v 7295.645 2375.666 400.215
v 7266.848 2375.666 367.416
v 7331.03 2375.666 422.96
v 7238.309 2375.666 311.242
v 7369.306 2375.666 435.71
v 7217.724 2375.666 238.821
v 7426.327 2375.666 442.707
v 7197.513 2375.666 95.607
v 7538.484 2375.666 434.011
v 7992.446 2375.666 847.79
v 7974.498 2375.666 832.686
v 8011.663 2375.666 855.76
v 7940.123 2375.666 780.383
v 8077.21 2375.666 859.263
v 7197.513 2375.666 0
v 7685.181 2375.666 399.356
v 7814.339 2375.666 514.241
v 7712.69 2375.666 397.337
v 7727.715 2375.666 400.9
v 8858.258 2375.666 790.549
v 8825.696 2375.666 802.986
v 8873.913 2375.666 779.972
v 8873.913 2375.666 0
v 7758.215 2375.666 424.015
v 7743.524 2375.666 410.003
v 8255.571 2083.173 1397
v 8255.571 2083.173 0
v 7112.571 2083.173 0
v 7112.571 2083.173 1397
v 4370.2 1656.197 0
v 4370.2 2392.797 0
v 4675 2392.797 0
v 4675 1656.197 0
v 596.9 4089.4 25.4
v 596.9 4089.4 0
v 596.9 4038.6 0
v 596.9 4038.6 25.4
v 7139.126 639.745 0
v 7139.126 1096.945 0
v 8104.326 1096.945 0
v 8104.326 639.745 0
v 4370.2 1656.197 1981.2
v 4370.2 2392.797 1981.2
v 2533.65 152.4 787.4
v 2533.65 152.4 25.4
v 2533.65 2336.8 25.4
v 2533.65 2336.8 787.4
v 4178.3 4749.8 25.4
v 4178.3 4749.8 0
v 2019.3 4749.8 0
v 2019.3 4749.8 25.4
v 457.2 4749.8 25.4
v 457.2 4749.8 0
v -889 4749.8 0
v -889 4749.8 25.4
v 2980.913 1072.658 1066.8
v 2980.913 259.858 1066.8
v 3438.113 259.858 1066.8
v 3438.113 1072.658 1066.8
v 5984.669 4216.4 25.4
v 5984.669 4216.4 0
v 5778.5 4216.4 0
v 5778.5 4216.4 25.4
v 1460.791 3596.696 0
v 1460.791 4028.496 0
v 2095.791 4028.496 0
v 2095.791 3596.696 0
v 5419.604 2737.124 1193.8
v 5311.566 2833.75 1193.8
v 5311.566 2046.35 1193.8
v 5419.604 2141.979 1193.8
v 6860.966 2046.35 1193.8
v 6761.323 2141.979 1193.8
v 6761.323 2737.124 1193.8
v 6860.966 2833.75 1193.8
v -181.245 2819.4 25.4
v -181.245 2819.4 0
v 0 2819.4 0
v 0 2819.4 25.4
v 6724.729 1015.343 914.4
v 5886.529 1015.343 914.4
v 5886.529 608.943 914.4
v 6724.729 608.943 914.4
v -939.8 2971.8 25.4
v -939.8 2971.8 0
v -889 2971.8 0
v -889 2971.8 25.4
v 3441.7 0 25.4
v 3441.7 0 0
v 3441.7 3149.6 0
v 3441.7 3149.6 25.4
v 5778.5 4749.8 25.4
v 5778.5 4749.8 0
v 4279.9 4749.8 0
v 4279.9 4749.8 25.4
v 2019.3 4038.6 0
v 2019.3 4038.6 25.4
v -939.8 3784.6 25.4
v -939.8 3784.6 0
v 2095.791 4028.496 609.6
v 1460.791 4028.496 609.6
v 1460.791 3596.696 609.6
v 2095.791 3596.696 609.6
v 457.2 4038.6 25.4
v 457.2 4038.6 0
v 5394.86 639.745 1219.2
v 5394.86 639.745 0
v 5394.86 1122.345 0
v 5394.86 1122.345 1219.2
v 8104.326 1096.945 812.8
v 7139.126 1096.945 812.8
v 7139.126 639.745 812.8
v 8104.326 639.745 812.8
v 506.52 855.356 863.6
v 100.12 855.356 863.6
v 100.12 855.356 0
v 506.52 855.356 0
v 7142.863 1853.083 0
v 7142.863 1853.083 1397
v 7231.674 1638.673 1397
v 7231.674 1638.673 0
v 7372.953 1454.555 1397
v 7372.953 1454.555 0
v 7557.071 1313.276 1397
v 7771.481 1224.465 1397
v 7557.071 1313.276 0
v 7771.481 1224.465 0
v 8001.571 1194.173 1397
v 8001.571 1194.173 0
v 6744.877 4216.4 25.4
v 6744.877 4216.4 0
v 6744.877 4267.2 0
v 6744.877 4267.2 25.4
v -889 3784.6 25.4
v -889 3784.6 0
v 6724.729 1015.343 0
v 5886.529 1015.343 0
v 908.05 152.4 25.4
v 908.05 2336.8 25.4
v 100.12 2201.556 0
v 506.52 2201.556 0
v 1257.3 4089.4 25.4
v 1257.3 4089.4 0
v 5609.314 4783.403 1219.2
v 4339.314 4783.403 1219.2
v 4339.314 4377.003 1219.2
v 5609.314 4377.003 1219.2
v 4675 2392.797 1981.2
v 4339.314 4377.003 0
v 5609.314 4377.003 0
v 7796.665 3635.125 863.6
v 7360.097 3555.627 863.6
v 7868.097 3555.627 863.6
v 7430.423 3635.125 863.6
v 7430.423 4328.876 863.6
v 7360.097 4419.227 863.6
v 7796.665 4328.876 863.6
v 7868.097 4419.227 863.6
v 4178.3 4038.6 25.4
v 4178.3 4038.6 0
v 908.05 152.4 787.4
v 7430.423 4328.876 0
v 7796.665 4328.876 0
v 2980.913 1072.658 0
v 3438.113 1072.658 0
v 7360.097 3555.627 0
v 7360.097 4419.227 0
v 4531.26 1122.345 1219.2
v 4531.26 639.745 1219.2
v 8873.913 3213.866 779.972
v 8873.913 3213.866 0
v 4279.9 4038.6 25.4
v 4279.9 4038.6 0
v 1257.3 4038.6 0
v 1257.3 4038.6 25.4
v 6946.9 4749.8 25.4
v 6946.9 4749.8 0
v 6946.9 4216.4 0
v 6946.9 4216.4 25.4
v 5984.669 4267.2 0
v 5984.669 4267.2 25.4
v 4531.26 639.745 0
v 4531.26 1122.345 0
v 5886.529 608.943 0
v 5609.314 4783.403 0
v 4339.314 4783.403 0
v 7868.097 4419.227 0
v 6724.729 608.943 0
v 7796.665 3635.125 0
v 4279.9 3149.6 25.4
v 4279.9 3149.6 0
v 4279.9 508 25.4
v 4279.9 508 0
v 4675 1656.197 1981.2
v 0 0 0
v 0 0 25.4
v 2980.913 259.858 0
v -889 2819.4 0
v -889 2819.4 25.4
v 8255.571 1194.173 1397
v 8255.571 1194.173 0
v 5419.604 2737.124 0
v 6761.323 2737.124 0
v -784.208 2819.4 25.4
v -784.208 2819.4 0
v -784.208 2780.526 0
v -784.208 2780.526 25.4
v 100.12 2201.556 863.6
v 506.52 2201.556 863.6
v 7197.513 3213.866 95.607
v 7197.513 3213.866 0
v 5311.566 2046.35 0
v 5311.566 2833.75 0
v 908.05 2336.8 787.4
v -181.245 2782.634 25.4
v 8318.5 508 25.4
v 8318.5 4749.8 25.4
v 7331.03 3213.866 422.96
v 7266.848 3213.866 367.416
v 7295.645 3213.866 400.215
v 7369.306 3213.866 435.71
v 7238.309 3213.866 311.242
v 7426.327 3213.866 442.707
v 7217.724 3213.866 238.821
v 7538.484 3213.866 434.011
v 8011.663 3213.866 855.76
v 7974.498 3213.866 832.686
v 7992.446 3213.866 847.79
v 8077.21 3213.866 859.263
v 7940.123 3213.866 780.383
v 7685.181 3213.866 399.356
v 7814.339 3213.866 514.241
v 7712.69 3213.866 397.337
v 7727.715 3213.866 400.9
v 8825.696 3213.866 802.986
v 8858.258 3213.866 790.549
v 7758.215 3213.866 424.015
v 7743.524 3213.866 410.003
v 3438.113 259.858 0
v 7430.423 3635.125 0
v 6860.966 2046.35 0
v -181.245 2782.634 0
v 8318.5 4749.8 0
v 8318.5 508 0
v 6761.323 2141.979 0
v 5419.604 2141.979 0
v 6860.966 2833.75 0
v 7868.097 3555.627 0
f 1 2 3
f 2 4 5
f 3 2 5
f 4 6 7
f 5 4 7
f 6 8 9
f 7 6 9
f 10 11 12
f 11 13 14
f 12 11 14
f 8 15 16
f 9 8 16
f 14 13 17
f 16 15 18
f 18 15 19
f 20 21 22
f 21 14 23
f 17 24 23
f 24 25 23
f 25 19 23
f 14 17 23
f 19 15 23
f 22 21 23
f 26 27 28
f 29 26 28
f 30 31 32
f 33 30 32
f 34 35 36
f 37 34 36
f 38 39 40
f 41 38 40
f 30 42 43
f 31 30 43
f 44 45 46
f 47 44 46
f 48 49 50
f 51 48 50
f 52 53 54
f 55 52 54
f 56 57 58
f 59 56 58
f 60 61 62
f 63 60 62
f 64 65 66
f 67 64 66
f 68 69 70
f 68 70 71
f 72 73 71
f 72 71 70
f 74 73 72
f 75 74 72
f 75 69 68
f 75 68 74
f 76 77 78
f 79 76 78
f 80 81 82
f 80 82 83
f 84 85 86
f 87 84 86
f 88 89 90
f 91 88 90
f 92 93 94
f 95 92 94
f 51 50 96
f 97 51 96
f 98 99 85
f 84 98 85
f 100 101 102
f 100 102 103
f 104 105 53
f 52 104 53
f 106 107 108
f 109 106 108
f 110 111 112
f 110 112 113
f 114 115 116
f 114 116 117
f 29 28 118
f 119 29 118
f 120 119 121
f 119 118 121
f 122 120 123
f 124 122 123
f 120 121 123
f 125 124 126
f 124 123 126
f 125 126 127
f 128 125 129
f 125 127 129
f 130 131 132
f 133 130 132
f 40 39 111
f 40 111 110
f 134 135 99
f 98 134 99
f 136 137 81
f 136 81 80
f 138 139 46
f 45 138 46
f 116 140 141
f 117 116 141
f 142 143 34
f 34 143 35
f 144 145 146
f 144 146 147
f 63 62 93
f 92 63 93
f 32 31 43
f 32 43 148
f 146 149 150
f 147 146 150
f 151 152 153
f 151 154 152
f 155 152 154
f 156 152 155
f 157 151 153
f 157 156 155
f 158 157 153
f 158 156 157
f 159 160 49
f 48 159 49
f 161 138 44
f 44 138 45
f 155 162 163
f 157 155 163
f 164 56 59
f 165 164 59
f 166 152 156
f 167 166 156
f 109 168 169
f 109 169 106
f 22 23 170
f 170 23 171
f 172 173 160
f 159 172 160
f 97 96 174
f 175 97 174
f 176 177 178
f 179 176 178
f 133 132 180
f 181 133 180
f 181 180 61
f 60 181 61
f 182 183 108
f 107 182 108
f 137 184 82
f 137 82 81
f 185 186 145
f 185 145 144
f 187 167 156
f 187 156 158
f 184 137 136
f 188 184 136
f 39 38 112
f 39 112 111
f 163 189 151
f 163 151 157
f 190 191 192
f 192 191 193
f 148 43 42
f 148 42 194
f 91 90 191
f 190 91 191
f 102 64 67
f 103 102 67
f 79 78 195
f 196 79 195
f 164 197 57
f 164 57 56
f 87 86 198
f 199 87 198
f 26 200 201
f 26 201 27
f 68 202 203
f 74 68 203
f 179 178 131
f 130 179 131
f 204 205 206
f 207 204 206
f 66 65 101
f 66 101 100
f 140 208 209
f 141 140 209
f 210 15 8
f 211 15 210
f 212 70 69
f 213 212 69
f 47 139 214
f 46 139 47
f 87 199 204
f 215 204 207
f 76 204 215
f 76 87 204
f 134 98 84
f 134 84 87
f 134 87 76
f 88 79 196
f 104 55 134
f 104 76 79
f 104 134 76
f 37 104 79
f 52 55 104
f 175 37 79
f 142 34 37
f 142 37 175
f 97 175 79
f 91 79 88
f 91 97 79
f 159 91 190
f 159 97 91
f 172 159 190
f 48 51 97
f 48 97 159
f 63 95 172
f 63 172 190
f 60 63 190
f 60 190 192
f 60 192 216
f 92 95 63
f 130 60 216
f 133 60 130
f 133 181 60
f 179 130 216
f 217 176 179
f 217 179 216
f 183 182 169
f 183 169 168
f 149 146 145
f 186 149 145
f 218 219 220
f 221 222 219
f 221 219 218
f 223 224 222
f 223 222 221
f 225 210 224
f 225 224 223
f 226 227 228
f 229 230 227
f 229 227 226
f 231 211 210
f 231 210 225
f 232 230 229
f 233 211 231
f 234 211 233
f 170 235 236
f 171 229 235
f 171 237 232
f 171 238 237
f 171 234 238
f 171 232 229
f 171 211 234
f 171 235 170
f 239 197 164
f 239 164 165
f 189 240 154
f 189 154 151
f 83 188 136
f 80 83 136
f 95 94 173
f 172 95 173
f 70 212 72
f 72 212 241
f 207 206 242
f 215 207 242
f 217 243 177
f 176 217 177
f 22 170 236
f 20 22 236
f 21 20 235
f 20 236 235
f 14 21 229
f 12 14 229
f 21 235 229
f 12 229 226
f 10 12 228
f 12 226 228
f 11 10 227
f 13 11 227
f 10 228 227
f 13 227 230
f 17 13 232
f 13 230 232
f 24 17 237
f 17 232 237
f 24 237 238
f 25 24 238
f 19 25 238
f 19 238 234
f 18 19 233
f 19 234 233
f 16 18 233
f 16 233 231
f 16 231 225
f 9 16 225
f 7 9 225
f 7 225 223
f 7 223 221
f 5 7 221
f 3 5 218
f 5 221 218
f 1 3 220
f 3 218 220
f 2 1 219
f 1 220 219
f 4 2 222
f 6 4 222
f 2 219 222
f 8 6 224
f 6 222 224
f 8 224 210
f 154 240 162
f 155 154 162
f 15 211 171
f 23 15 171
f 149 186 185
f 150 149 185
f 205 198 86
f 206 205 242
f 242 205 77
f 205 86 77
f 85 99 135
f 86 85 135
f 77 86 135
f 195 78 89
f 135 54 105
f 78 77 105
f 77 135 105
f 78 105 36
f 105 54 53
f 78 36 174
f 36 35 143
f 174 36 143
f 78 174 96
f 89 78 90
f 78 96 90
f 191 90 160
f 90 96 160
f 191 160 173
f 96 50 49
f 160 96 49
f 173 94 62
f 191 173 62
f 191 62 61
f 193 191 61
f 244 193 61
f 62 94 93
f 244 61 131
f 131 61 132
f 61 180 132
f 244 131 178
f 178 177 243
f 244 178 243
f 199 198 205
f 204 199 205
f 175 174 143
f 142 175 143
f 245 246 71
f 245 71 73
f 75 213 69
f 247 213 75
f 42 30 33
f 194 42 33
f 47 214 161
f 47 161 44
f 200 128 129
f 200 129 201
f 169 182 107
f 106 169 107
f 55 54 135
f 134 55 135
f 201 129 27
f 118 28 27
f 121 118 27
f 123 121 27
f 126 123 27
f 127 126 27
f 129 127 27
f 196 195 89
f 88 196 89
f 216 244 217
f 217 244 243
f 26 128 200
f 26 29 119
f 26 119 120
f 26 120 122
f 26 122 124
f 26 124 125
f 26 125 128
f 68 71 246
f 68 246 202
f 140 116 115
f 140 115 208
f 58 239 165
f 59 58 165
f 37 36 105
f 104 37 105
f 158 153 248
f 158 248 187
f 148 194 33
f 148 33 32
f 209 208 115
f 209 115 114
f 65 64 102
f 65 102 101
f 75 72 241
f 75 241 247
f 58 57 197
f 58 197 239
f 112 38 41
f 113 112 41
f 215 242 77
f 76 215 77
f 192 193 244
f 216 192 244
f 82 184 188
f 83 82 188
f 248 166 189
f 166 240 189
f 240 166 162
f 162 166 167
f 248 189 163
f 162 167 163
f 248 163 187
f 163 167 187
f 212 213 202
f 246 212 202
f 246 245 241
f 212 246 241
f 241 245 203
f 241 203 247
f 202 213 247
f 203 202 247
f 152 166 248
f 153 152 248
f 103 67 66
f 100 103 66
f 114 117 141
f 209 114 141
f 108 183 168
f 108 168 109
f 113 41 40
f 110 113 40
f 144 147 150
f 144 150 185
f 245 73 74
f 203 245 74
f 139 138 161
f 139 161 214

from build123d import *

# Parameters (mm, degrees)
F1_DEPTH  = 25.4
F2_W      = 1625.6
F2_H      = 2184.4
F3_DEPTH  = 762
F4_W      = 1270
F4_H      = 406.4
F5_DEPTH  = 1219.2
F6_W      = 965.2
F6_H      = 457.2
F7_DEPTH  = 812.8
F8_W      = 254
F8_H      = 889
F9_DEPTH  = 1397
F10_W     = 863.6
F10_H     = 482.6
F11_DEPTH = 1219.2
F12_W     = 635
F12_H     = 431.8
F13_DEPTH = 609.6
F14_W     = 304.8
F14_H     = 736.6
F15_DEPTH = 1981.2
F16_W     = 457.2
F16_H     = 812.8
F17_DEPTH = 1066.8
F18_W     = 406.4
F18_H     = 1346.2
F19_DEPTH = 863.6
F20_W     = 838.2
F20_H     = 406.4
F21_DEPTH = 914.4
F22_W     = 1549.4
F22_H     = 787.4
F22_W_2   = 1341.7191505432
F22_H_2   = 595.1457023621
F23_DEPTH = 1193.8
F24_W     = 508
F24_H     = 863.6
F24_W_2   = 366.2426
F24_H_2   = 693.7502
F25_DEPTH = 863.6
F26_W     = 1676.4
F26_H     = 838.2
F27_DEPTH = 914.4
F29_DEPTH = 838.2


with BuildPart() as f1:
    # F0 (on Top) → F1 (new body)
    with BuildSketch(Plane.XY):
        Polygon((0, 2717.8), (0, 0), (3441.7, 0), (3441.7, 3048), (3441.7, 3149.6), (3543.3, 3149.6), (4178.3, 3149.6), (4279.9, 3149.6), (4279.9, 3048), (4279.9, 508), (8318.5, 508), (8318.5, 4749.8), (6946.9, 4749.8), (6946.9, 4216.4), (6845.3, 4216.4), (6744.8768615723, 4216.4), (6744.8768615723, 4267.2), (5984.6692085266, 4267.2), (5984.6692085266, 4216.4), (5880.1, 4216.4), (5778.5, 4216.4), (5778.5, 4318), (5778.5, 4749.8), (4279.9, 4749.8), (4279.9, 4038.6), (4178.3, 4038.6), (4178.3, 4749.8), (2019.3, 4749.8), (2019.3, 4140.2), (2019.3, 4038.6), (1917.7, 4038.6), (1485.9, 4038.6), (1397, 4038.6), (1295.4, 4038.6), (1257.3, 4038.6), (1257.3, 4089.4), (596.9, 4089.4), (596.9, 4038.6), (558.8, 4038.6), (457.2, 4038.6), (457.2, 4749.8), (-889, 4749.8), (-889, 4495.8), (-889, 3784.6), (-939.8, 3784.6), (-939.8, 2971.8), (-889, 2971.8), (-889, 2819.4), (-784.2075228691, 2819.4), (-784.2075228691, 2780.5261611938), (-181.2450289726, 2782.6342582703), (-181.2450289726, 2819.4), (-101.6, 2819.4), (0, 2819.4), align=None)
    extrude(amount=F1_DEPTH)


with BuildPart() as f3:
    # F2 (on face) → F3 (new body)
    with BuildSketch(Plane.XY.offset(25.4)):
        with Locations((1720.85, 1244.6)):
            Rectangle(F2_W, F2_H)
    extrude(amount=F3_DEPTH)


with BuildPart() as f5:
    # F4 (on Top) → F5 (new body)
    with BuildSketch(Plane.XY):
        with Locations((4974.3144416809, 4580.2027160645)):
            Rectangle(F4_W, F4_H)
    extrude(amount=F5_DEPTH)


with BuildPart() as f7:
    # F6 (on Top) → F7 (new body)
    with BuildSketch(Plane.XY):
        with Locations((7621.7263008118, 868.344579792)):
            Rectangle(F6_W, F6_H)
    extrude(amount=F7_DEPTH)


with BuildPart() as f9:
    # F8 (on Top) → F9 (new body)
    with BuildSketch(Plane.XY):
        with Locations((8128.5707015991, 1638.6728591919)):
            Rectangle(F8_W, F8_H)
        with BuildLine():
            ThreePointArc((7112.5707015991, 2083.1728591919), (7372.9527731243, 1454.5549307171), (8001.5707015991, 1194.1728591919))
            Line((8001.5707015991, 1194.1728591919), (8001.5707015991, 2083.1728591919))
            Line((8001.5707015991, 2083.1728591919), (7112.5707015991, 2083.1728591919))
        make_face()
    extrude(amount=F9_DEPTH)


with BuildPart() as f11:
    # F10 (on Top) → F11 (new body)
    with BuildSketch(Plane.XY):
        with Locations((4963.0595367432, 881.044579792)):
            Rectangle(F10_W, F10_H)
    extrude(amount=F11_DEPTH)


with BuildPart() as f13:
    # F12 (on Top) → F13 (new body)
    with BuildSketch(Plane.XY):
        with Locations((1778.290880394, 3812.5958999634)):
            Rectangle(F12_W, F12_H)
    extrude(amount=F13_DEPTH)


with BuildPart() as f15:
    # F14 (on Top) → F15 (new body)
    with BuildSketch(Plane.XY):
        with Locations((4522.6001907349, 2024.4965942383)):
            Rectangle(F14_W, F14_H)
    extrude(amount=F15_DEPTH)


with BuildPart() as f17:
    # F16 (on Top) → F17 (new body)
    with BuildSketch(Plane.XY):
        with Locations((3209.51340065, 666.2584294319)):
            Rectangle(F16_W, F16_H)
    extrude(amount=F17_DEPTH)


with BuildPart() as f19:
    # F18 (on Top) → F19 (new body)
    with BuildSketch(Plane.XY):
        with Locations((303.319973278, 1528.4556203842)):
            Rectangle(F18_W, F18_H)
    extrude(amount=F19_DEPTH)


with BuildPart() as f21:
    # F20 (on Top) → F21 (new body)
    with BuildSketch(Plane.XY):
        with Locations((6305.628968811, 812.1428663254)):
            Rectangle(F20_W, F20_H)
    extrude(amount=F21_DEPTH)


with BuildPart() as f23:
    # F22 (on Top) → F23 (new body)
    with BuildSketch(Plane.XY):
        with Locations((6086.2658760071, 2440.0500022888)):
            Rectangle(F22_W, F22_H)
        with Locations((6090.4633998871, 2439.5515918732)):
            Rectangle(F22_W_2, F22_H_2, mode=Mode.SUBTRACT)
    extrude(amount=F23_DEPTH)


with BuildPart() as f25:
    # F24 (on Top) → F25 (new body)
    with BuildSketch(Plane.XY):
        with Locations((7614.0968284607, 3987.4273460388)):
            Rectangle(F24_W, F24_H)
        with Locations((7613.5438916504, 3982.0004986359)):
            Rectangle(F24_W_2, F24_H_2, mode=Mode.SUBTRACT)
    extrude(amount=F25_DEPTH)


with BuildPart() as f27:
    # F26 (on Top) → F27 (new body)
    with BuildSketch(Plane.XY):
        with Locations((8035.7133743286, 2794.7656646729)):
            Rectangle(F26_W, F26_H)
    extrude(amount=F27_DEPTH)

    # F28 (on face) → F29 (cut, through all)
    with BuildSketch(Plane(origin=(0, 3213.8656646729, 0), x_dir=(-1, 0, 0), z_dir=(0, 1, 0))):
        with BuildLine():
            Line((-8873.9133743286, 914.4), (-8873.9133743286, 779.9721360207))
            add(Edge.make_bspline(
                [(-8873.9133743286, 779.9721360207), (-8805.7552267889, 845.5248363303), (-8075.7860491427, 854.3843914375), (-7950.8738247225, 869.5022571575), (-7776.6322981899, 363.3350625902), (-7644.4897854288, 415.7580891444), (-7240.0854441812, 501.7241843801), (-7209.5195755059, 208.5033285965), (-7197.5133743286, 95.6071093678)],
                knots=[0, 0, 0, 0, 0.2565393304, 0.3702933341, 0.5652174897, 0.6630583267, 0.8306296411, 1, 1, 1, 1], degree=3))
            Line((-7197.5133743286, 95.6071093678), (-7197.5133743286, 914.4))
            Line((-7197.5133743286, 914.4), (-8873.9133743286, 914.4))
        make_face()
    extrude(amount=-F29_DEPTH, mode=Mode.SUBTRACT)


solid = Compound([f1.part, f3.part, f5.part, f7.part, f9.part, f11.part, f13.part, f15.part, f17.part, f19.part, f21.part, f23.part, f25.part, f27.part])
